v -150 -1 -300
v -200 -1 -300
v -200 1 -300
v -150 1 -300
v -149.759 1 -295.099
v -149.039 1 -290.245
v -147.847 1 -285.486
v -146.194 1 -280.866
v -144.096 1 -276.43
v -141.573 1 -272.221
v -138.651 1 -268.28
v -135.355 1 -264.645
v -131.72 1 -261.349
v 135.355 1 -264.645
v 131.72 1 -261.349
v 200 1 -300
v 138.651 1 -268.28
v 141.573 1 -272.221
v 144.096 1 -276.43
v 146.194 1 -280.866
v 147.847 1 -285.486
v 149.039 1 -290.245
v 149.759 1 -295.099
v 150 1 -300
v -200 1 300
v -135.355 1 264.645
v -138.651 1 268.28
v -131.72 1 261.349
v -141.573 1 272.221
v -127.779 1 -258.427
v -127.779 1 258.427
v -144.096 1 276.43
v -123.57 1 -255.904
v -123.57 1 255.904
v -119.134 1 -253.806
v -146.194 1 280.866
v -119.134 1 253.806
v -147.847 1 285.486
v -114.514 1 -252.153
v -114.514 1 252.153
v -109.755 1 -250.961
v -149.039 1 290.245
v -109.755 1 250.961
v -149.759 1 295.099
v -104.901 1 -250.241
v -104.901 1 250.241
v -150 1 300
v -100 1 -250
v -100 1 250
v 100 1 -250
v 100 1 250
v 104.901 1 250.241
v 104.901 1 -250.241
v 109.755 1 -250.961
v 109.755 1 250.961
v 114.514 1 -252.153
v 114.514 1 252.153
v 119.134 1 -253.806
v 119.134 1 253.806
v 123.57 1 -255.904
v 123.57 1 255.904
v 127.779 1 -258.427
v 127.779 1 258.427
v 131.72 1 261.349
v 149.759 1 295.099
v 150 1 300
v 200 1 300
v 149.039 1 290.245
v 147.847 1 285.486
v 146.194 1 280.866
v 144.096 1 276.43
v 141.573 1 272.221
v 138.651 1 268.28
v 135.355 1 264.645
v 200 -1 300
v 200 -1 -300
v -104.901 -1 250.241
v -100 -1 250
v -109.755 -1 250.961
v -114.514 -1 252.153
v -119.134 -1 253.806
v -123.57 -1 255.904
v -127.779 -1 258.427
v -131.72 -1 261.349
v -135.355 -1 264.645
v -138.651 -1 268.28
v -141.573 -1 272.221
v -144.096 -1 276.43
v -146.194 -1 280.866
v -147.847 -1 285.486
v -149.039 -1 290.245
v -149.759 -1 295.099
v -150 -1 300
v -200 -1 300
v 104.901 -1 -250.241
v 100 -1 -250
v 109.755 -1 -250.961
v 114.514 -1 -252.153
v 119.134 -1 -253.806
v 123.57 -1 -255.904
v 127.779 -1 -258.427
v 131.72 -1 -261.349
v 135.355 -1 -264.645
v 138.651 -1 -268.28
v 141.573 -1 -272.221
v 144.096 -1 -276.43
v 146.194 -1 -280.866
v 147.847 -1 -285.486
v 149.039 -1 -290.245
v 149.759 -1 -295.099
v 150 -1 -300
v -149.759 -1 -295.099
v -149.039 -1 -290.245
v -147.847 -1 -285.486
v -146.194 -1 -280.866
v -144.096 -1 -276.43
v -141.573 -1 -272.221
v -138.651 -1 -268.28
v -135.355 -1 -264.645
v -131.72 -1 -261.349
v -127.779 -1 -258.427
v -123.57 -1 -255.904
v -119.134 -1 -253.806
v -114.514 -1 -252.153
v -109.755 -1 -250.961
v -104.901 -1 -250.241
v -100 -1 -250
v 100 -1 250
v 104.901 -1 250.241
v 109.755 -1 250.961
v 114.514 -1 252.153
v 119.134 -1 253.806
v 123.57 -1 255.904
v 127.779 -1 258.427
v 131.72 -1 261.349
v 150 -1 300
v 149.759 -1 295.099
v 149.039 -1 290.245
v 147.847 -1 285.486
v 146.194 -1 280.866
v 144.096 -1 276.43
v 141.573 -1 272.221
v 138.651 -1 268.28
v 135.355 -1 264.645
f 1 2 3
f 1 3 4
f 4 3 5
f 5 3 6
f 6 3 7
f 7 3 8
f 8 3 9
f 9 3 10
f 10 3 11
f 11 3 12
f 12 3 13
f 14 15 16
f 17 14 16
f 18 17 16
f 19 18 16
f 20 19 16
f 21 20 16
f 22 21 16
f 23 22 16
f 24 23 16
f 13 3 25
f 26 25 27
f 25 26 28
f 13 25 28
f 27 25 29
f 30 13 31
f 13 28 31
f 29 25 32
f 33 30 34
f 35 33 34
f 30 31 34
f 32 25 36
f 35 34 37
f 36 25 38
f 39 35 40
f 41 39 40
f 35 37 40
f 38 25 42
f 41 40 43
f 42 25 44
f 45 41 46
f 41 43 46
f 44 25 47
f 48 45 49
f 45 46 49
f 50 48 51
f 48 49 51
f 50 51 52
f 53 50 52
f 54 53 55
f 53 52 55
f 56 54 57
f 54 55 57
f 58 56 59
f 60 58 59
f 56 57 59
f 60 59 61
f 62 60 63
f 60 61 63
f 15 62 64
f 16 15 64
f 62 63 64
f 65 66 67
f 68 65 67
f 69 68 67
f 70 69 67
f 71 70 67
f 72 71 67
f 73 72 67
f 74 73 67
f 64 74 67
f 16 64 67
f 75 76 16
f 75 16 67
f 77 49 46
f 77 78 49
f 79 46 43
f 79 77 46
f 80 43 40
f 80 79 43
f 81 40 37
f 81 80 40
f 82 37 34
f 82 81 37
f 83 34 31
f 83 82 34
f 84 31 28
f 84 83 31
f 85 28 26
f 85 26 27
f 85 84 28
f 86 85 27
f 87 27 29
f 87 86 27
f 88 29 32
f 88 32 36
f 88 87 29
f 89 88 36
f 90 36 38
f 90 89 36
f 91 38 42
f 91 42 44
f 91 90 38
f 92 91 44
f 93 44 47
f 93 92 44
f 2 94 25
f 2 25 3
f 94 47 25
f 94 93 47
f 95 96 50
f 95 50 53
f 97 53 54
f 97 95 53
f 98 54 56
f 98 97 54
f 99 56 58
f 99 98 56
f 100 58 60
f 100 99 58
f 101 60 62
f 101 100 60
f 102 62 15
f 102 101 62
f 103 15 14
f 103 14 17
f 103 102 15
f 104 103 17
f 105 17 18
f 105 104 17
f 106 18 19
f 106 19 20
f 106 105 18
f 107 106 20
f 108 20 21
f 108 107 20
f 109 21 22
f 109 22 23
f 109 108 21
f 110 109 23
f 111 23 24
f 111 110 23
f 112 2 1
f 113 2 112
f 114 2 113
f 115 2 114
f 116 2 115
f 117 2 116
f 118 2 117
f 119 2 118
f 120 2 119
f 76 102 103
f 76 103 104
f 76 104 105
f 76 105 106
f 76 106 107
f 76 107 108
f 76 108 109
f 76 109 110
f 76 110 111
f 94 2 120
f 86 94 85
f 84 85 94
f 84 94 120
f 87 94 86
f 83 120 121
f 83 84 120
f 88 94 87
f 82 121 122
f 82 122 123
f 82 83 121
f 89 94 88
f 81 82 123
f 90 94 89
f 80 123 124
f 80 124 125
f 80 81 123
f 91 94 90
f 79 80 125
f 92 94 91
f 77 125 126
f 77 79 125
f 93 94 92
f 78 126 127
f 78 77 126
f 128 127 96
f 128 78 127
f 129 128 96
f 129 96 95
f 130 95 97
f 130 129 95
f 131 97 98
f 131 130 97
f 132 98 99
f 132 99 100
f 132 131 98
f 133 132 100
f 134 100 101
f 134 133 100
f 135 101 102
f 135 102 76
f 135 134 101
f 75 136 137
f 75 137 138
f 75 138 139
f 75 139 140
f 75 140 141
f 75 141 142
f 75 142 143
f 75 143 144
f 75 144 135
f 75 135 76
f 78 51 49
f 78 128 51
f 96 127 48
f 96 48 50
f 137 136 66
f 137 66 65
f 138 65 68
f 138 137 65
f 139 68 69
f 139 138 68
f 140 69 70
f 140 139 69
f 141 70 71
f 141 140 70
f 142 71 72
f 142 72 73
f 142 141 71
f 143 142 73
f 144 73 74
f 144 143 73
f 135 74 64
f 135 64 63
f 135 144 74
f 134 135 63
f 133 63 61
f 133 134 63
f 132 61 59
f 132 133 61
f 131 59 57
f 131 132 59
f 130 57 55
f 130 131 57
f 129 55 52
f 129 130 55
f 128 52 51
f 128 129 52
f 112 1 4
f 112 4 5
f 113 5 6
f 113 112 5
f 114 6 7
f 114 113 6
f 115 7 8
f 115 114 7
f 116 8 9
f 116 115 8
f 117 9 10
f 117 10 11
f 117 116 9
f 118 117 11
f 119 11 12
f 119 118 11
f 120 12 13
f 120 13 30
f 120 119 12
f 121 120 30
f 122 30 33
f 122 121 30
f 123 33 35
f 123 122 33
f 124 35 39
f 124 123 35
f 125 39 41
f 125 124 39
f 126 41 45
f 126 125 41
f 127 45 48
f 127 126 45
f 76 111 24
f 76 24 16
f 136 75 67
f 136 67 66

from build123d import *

# Parameters (mm, degrees)
F1_DEPTH = 1


with BuildPart() as f1:
    # F0 (on Front) → F1 (new body, symmetric)
    with BuildSketch(Plane.XZ):
        with BuildLine():
            Line((-150, 300), (-200, 300))
            Line((-200, 300), (-200, -300))
            Line((-200, -300), (-150, -300))
            ThreePointArc((-150, -300), (-135.355339, -264.644661), (-100, -250))
            Line((-100, -250), (100, -250))
            ThreePointArc((100, -250), (135.355339, -264.644661), (150, -300))
            Line((150, -300), (200, -300))
            Line((200, -300), (200, 300))
            Line((200, 300), (150, 300))
            ThreePointArc((150, 300), (135.355339, 264.644661), (100, 250))
            Line((100, 250), (-100, 250))
            ThreePointArc((-100, 250), (-135.355339, 264.644661), (-150, 300))
        make_face()
    extrude(amount=F1_DEPTH, both=True)


solid = f1.part
